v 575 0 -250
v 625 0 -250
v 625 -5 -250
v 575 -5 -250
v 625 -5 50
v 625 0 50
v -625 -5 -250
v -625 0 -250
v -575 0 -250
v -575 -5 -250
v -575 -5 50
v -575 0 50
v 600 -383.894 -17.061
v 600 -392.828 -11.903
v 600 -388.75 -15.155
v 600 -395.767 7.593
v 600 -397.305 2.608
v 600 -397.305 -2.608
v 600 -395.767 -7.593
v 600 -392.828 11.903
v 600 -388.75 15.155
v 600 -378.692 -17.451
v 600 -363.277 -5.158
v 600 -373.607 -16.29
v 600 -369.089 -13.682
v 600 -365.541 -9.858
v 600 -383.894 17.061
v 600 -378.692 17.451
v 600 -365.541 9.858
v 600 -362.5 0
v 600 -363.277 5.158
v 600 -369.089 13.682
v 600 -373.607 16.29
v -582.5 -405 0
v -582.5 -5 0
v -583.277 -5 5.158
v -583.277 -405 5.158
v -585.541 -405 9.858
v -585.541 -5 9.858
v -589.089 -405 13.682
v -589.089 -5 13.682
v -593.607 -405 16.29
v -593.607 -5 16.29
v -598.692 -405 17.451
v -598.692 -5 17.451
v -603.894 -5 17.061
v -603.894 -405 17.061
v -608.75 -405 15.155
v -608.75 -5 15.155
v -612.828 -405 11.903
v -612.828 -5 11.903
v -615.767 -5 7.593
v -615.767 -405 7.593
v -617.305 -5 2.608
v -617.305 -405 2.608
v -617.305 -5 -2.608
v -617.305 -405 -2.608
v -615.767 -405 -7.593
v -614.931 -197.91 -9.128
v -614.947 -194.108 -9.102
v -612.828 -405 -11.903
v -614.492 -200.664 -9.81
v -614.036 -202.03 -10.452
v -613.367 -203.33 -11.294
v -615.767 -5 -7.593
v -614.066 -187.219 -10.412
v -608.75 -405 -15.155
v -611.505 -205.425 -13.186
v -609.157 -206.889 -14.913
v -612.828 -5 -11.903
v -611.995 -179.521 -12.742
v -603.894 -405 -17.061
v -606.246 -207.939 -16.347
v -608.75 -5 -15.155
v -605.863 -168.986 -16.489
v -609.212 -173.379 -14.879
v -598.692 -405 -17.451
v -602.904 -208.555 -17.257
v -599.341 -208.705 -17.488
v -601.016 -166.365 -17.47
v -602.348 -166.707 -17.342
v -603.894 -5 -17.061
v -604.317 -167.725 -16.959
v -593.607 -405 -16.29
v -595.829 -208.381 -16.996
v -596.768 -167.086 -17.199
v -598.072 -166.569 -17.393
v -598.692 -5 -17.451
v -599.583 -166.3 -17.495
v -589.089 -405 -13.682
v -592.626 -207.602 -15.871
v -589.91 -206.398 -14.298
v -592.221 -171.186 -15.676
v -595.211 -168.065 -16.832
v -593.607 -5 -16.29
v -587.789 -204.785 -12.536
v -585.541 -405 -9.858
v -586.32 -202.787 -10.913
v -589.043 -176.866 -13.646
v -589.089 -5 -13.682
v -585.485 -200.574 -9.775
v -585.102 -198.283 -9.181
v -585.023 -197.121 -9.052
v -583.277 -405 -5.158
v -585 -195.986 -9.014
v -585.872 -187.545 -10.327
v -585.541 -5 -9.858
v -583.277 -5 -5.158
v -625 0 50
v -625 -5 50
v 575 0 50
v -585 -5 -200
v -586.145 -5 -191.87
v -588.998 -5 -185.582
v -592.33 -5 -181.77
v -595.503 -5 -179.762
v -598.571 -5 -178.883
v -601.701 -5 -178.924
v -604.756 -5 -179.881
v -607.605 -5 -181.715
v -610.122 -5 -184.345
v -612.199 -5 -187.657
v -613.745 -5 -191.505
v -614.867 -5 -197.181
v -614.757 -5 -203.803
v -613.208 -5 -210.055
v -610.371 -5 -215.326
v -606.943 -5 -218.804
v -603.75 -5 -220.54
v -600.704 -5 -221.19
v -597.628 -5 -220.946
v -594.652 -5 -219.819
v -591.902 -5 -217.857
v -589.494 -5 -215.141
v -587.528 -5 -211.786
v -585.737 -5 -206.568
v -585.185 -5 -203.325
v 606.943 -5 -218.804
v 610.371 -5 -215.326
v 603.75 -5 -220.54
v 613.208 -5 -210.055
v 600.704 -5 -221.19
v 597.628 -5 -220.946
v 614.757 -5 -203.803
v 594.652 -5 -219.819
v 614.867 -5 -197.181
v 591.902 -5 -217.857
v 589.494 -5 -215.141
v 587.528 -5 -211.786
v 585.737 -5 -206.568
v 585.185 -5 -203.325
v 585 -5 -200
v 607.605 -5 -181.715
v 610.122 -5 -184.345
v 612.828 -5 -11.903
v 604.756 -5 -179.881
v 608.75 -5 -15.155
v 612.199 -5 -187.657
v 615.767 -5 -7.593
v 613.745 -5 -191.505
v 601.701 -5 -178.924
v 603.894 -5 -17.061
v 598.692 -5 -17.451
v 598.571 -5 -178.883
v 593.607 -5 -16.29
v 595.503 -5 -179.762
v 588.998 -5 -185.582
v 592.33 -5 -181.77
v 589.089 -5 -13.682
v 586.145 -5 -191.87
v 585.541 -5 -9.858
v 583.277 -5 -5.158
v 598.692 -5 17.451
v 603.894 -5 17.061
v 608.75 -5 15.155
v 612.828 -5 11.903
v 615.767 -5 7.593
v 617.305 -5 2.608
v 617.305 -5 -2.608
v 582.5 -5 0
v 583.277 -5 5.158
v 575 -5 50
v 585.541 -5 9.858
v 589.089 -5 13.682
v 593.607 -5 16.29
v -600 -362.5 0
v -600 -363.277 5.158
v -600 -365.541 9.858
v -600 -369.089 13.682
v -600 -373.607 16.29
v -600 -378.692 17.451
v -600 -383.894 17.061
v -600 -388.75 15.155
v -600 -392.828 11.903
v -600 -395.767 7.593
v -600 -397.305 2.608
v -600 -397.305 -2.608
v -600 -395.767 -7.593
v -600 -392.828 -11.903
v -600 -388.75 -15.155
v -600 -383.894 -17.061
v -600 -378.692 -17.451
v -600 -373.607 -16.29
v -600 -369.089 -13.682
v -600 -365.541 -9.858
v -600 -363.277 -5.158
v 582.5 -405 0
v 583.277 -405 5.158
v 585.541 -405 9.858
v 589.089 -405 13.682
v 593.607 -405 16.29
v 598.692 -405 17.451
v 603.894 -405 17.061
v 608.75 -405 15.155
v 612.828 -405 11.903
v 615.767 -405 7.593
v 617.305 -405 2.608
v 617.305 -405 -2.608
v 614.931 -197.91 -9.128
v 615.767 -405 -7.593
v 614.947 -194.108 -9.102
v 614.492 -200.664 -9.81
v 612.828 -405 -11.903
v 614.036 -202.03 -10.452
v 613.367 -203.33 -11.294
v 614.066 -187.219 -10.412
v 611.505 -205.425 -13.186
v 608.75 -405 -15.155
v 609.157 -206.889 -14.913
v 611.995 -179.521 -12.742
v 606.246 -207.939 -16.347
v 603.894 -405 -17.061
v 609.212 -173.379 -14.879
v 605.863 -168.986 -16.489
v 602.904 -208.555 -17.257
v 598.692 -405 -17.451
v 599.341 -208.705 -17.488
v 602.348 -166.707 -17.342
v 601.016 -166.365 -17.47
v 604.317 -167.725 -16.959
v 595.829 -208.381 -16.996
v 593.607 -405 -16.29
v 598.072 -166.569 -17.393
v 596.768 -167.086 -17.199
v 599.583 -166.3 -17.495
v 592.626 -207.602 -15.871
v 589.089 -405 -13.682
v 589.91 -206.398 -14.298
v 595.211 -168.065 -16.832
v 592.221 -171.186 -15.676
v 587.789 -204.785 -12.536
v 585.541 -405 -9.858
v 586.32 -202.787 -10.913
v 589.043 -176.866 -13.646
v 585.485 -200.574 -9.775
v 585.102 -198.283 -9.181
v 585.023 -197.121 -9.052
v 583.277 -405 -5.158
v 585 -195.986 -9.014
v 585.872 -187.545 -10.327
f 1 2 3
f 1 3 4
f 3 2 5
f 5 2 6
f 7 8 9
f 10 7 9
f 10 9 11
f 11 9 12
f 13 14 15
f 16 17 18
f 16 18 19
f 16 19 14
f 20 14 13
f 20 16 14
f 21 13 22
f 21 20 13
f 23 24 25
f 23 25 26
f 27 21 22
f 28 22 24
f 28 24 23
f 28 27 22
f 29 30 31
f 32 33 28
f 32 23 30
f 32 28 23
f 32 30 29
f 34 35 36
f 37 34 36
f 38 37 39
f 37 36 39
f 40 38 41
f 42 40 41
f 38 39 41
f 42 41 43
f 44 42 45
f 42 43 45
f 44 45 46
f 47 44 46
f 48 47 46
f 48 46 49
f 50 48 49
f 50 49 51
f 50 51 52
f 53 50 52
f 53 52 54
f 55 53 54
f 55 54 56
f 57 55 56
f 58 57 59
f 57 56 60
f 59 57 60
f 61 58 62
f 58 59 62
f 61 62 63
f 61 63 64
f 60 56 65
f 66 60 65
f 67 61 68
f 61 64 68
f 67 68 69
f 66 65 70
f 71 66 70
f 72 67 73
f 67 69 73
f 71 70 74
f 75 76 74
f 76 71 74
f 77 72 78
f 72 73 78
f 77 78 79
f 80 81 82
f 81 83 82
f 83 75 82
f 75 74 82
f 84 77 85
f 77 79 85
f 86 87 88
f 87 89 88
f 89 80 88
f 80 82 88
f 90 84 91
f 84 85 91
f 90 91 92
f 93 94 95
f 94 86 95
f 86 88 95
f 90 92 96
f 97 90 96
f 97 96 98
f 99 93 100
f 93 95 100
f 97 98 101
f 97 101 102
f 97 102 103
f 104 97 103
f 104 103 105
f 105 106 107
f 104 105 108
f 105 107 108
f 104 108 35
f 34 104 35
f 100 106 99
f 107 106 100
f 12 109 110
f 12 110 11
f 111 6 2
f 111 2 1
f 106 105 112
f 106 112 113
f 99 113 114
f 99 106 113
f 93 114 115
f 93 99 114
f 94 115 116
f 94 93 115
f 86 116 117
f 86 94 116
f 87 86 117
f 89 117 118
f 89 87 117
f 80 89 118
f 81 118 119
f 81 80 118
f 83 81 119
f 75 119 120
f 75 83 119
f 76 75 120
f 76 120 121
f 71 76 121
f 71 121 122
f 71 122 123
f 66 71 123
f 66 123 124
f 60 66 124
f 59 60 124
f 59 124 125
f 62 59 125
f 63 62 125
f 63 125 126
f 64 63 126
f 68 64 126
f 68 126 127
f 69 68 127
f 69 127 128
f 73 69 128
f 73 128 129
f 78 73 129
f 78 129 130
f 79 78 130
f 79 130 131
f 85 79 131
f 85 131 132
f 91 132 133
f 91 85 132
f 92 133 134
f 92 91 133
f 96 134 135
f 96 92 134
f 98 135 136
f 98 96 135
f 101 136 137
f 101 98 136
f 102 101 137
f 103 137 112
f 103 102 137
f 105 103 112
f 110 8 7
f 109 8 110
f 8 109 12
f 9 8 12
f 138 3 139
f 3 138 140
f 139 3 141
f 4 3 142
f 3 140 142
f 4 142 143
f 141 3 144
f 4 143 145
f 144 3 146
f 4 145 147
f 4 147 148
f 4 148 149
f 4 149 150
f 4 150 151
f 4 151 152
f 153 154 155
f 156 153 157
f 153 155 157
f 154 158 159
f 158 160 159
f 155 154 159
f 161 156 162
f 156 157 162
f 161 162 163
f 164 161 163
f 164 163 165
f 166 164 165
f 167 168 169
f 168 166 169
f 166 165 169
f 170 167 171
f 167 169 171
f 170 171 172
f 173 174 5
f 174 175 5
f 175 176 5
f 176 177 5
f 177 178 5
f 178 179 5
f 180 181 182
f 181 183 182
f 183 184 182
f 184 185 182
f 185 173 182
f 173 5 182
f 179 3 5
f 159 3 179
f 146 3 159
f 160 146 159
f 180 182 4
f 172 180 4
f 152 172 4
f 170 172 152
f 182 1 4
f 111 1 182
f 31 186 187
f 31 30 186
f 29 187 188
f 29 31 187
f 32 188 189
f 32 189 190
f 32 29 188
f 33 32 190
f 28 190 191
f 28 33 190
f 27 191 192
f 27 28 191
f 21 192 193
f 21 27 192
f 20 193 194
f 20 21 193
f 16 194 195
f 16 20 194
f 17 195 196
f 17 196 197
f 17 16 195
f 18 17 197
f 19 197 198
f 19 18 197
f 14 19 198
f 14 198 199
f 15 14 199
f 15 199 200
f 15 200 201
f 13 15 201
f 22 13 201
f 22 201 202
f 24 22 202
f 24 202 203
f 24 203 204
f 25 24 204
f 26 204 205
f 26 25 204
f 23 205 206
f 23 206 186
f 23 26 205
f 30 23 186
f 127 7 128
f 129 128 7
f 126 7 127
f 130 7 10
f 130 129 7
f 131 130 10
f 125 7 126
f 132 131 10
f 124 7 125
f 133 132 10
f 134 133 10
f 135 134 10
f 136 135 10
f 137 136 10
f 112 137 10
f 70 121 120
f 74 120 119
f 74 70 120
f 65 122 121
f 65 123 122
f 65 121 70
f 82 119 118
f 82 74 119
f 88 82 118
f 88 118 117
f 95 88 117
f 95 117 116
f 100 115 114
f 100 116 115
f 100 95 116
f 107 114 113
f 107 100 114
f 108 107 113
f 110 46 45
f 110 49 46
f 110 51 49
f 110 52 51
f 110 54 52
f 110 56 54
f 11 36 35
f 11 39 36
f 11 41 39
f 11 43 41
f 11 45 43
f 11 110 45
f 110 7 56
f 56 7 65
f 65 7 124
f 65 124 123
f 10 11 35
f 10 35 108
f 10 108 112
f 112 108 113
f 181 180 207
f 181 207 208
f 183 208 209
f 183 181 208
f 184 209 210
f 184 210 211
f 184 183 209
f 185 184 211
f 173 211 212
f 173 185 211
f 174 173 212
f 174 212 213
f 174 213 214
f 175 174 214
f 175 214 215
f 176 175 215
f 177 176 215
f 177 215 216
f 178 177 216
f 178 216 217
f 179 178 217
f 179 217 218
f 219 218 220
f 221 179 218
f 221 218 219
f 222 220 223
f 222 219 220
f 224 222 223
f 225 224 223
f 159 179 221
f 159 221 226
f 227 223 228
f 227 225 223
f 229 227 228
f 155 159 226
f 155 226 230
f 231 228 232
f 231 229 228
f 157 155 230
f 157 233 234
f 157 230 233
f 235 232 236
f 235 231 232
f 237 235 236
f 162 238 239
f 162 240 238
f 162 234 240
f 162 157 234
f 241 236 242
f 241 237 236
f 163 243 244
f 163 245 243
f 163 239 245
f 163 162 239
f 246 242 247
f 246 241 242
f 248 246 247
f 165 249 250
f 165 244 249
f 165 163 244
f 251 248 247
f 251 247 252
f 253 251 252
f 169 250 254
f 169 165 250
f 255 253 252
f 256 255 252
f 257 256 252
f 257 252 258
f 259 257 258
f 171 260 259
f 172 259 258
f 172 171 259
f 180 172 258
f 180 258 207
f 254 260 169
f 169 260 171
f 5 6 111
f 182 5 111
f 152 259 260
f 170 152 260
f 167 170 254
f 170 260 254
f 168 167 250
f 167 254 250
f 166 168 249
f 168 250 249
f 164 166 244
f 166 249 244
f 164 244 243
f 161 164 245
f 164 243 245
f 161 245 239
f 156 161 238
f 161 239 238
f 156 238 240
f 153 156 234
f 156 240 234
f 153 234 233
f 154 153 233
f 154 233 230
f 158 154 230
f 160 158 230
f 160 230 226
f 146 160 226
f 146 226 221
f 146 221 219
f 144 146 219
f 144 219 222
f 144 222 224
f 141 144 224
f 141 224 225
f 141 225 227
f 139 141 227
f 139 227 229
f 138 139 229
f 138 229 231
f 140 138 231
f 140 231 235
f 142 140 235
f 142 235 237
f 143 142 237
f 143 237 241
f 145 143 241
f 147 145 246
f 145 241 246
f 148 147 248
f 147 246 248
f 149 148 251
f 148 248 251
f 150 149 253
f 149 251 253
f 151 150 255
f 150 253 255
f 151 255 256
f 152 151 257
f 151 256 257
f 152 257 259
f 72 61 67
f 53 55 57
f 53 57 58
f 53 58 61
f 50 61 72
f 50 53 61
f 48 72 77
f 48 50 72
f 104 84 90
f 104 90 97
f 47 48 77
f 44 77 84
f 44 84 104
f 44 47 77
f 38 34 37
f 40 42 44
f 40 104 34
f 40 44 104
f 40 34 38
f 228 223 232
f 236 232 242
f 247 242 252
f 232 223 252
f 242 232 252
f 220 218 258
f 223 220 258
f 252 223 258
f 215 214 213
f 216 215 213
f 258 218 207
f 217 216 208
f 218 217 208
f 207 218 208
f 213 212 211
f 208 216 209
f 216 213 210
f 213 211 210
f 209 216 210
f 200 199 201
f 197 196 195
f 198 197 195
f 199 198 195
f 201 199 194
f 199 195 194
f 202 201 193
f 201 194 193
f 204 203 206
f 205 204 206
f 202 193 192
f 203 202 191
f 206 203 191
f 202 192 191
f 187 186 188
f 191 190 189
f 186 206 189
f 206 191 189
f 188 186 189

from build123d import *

# Parameters (mm, degrees)
F0_W      = 50
F0_H      = 300
F1_DEPTH  = 5
F2_R      = 17.5
F3_DEPTH  = 400
F7_R      = 15
F8_REACH  = 364.1609923111
F10_R     = 17.5
F11_DEPTH = 600


with BuildPart() as f1:
    # F0 (on Front) → F1 (new body)
    with BuildSketch(Plane.XZ):
        with Locations((-600, -100)):
            Rectangle(F0_W, F0_H)
    extrude(amount=F1_DEPTH)

    # F2 (on face) → F3 (join)
    with BuildSketch(Plane.XZ.offset(5)):
        with Locations((-600, 0)):
            Circle(F2_R)
    extrude(amount=F3_DEPTH)

    f8_end = f1.faces().sort_by_distance((-600, -5, -106.8536862637))[0]
    # F7 (on line) → F8 (join, up to a face of the model that its end follows)
    with BuildSketch(Plane(origin=(0, -102.5, 102.5), x_dir=(1, 0, 0), z_dir=(0, -0.7071067812, 0.7071067812))):
        with Locations((-600, -144.9568901432)):
            Circle(F7_R)
    f8_long = extrude(amount=-F8_REACH, mode=Mode.PRIVATE)
    add(split(f8_long, bisect_by=f8_end, keep=Keep.TOP, mode=Mode.PRIVATE))


with BuildPart() as f9_1:
    # F9: instance of F1
    add(f1.part.mirror(Plane.YZ))


with BuildPart() as f11:
    # F10 (on Right) → F11 (new body, symmetric)
    with BuildSketch(Plane.YZ):
        with Locations((-380, 0)):
            Circle(F10_R)
    extrude(amount=F11_DEPTH, both=True)


solid = Compound([f1.part, f9_1.part, f11.part])
